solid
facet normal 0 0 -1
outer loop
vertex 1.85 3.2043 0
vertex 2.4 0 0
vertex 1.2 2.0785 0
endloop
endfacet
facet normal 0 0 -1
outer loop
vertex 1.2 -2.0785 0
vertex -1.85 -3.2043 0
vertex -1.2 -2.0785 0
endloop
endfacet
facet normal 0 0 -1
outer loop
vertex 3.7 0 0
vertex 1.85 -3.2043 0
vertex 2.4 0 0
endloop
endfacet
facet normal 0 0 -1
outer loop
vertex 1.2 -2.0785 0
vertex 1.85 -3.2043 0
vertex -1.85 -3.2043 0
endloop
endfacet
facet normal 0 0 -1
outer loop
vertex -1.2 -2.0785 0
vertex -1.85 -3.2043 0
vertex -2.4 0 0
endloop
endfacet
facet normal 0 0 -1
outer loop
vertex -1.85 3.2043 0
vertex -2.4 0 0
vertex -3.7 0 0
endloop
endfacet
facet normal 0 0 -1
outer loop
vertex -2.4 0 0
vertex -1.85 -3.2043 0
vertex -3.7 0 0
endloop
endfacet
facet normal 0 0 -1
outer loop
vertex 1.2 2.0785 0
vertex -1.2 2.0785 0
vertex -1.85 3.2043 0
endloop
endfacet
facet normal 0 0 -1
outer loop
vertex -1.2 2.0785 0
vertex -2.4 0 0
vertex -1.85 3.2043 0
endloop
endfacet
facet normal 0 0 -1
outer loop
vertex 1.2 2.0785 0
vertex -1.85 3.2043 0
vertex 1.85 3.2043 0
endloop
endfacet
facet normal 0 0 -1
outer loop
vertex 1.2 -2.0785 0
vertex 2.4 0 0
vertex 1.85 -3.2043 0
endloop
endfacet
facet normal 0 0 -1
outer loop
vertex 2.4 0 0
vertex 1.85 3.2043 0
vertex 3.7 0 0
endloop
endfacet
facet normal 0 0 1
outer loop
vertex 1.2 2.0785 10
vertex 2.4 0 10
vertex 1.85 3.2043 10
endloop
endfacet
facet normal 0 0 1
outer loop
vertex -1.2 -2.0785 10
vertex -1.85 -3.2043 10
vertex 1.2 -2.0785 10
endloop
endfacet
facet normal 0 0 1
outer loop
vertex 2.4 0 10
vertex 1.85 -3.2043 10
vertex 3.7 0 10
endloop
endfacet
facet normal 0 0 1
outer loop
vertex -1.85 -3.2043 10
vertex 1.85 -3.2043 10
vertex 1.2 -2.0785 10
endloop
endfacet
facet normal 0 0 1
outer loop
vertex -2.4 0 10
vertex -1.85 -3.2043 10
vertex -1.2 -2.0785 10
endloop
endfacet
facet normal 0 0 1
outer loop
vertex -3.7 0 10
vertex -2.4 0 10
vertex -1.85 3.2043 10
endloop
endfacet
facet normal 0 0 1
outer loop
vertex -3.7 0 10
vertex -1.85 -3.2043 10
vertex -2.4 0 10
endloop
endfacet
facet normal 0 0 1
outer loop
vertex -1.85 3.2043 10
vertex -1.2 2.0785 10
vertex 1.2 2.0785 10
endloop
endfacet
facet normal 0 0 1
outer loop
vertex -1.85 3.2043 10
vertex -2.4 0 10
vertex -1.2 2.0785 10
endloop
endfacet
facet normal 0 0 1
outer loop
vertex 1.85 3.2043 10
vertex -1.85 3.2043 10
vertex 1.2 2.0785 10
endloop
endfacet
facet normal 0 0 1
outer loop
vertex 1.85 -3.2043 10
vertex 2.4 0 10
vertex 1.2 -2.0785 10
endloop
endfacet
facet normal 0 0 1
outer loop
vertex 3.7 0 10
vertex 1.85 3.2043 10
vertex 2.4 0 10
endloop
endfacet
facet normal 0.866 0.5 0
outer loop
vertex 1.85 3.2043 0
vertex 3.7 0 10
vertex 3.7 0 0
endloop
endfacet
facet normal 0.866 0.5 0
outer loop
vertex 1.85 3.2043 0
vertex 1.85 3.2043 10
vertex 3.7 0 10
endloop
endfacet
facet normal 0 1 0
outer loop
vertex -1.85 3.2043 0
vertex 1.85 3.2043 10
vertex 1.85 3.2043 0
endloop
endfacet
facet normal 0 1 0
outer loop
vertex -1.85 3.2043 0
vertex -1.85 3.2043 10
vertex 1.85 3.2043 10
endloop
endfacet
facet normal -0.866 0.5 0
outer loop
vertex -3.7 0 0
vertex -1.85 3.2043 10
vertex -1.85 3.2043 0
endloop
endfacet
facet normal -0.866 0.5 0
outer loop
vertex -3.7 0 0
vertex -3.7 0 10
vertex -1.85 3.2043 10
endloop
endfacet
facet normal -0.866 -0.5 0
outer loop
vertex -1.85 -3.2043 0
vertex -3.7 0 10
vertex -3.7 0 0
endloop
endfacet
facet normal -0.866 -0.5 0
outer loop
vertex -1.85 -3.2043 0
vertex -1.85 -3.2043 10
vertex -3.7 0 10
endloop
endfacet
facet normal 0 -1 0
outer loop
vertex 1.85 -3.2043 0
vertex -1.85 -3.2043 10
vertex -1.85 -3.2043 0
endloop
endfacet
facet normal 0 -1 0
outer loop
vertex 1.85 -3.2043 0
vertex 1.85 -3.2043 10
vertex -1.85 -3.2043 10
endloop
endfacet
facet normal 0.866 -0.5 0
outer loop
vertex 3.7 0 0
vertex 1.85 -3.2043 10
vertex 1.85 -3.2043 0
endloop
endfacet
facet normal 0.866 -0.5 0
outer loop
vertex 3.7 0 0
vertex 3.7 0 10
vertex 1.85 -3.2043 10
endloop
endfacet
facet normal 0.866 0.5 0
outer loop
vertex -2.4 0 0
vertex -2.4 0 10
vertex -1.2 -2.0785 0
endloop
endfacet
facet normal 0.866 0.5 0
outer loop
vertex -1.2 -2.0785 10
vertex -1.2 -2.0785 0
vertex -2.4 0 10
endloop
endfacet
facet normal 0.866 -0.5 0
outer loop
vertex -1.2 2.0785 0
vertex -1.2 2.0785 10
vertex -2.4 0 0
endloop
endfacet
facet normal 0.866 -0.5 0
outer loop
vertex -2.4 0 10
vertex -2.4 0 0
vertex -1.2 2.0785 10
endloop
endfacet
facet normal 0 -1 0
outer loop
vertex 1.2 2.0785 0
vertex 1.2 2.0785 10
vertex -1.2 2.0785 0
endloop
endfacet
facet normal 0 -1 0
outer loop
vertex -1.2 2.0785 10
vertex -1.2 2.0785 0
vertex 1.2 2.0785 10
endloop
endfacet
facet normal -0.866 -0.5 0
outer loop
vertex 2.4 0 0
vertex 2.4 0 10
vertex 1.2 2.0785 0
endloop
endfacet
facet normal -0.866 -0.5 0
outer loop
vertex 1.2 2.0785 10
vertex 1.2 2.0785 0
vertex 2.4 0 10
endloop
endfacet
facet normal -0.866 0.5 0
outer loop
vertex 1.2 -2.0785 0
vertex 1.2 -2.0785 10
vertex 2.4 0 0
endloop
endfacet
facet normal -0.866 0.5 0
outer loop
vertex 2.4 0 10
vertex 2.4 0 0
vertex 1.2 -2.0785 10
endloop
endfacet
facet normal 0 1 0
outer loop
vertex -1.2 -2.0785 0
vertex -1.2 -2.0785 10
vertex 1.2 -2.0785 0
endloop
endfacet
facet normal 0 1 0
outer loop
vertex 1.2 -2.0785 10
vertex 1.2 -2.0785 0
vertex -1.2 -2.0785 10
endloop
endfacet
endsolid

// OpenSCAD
linear_extrude(10){
difference(){
Hex(7.4);
Hex(4.8);
}
}
module Hex(size){
 circle(size/2,$fn=6);
} 
